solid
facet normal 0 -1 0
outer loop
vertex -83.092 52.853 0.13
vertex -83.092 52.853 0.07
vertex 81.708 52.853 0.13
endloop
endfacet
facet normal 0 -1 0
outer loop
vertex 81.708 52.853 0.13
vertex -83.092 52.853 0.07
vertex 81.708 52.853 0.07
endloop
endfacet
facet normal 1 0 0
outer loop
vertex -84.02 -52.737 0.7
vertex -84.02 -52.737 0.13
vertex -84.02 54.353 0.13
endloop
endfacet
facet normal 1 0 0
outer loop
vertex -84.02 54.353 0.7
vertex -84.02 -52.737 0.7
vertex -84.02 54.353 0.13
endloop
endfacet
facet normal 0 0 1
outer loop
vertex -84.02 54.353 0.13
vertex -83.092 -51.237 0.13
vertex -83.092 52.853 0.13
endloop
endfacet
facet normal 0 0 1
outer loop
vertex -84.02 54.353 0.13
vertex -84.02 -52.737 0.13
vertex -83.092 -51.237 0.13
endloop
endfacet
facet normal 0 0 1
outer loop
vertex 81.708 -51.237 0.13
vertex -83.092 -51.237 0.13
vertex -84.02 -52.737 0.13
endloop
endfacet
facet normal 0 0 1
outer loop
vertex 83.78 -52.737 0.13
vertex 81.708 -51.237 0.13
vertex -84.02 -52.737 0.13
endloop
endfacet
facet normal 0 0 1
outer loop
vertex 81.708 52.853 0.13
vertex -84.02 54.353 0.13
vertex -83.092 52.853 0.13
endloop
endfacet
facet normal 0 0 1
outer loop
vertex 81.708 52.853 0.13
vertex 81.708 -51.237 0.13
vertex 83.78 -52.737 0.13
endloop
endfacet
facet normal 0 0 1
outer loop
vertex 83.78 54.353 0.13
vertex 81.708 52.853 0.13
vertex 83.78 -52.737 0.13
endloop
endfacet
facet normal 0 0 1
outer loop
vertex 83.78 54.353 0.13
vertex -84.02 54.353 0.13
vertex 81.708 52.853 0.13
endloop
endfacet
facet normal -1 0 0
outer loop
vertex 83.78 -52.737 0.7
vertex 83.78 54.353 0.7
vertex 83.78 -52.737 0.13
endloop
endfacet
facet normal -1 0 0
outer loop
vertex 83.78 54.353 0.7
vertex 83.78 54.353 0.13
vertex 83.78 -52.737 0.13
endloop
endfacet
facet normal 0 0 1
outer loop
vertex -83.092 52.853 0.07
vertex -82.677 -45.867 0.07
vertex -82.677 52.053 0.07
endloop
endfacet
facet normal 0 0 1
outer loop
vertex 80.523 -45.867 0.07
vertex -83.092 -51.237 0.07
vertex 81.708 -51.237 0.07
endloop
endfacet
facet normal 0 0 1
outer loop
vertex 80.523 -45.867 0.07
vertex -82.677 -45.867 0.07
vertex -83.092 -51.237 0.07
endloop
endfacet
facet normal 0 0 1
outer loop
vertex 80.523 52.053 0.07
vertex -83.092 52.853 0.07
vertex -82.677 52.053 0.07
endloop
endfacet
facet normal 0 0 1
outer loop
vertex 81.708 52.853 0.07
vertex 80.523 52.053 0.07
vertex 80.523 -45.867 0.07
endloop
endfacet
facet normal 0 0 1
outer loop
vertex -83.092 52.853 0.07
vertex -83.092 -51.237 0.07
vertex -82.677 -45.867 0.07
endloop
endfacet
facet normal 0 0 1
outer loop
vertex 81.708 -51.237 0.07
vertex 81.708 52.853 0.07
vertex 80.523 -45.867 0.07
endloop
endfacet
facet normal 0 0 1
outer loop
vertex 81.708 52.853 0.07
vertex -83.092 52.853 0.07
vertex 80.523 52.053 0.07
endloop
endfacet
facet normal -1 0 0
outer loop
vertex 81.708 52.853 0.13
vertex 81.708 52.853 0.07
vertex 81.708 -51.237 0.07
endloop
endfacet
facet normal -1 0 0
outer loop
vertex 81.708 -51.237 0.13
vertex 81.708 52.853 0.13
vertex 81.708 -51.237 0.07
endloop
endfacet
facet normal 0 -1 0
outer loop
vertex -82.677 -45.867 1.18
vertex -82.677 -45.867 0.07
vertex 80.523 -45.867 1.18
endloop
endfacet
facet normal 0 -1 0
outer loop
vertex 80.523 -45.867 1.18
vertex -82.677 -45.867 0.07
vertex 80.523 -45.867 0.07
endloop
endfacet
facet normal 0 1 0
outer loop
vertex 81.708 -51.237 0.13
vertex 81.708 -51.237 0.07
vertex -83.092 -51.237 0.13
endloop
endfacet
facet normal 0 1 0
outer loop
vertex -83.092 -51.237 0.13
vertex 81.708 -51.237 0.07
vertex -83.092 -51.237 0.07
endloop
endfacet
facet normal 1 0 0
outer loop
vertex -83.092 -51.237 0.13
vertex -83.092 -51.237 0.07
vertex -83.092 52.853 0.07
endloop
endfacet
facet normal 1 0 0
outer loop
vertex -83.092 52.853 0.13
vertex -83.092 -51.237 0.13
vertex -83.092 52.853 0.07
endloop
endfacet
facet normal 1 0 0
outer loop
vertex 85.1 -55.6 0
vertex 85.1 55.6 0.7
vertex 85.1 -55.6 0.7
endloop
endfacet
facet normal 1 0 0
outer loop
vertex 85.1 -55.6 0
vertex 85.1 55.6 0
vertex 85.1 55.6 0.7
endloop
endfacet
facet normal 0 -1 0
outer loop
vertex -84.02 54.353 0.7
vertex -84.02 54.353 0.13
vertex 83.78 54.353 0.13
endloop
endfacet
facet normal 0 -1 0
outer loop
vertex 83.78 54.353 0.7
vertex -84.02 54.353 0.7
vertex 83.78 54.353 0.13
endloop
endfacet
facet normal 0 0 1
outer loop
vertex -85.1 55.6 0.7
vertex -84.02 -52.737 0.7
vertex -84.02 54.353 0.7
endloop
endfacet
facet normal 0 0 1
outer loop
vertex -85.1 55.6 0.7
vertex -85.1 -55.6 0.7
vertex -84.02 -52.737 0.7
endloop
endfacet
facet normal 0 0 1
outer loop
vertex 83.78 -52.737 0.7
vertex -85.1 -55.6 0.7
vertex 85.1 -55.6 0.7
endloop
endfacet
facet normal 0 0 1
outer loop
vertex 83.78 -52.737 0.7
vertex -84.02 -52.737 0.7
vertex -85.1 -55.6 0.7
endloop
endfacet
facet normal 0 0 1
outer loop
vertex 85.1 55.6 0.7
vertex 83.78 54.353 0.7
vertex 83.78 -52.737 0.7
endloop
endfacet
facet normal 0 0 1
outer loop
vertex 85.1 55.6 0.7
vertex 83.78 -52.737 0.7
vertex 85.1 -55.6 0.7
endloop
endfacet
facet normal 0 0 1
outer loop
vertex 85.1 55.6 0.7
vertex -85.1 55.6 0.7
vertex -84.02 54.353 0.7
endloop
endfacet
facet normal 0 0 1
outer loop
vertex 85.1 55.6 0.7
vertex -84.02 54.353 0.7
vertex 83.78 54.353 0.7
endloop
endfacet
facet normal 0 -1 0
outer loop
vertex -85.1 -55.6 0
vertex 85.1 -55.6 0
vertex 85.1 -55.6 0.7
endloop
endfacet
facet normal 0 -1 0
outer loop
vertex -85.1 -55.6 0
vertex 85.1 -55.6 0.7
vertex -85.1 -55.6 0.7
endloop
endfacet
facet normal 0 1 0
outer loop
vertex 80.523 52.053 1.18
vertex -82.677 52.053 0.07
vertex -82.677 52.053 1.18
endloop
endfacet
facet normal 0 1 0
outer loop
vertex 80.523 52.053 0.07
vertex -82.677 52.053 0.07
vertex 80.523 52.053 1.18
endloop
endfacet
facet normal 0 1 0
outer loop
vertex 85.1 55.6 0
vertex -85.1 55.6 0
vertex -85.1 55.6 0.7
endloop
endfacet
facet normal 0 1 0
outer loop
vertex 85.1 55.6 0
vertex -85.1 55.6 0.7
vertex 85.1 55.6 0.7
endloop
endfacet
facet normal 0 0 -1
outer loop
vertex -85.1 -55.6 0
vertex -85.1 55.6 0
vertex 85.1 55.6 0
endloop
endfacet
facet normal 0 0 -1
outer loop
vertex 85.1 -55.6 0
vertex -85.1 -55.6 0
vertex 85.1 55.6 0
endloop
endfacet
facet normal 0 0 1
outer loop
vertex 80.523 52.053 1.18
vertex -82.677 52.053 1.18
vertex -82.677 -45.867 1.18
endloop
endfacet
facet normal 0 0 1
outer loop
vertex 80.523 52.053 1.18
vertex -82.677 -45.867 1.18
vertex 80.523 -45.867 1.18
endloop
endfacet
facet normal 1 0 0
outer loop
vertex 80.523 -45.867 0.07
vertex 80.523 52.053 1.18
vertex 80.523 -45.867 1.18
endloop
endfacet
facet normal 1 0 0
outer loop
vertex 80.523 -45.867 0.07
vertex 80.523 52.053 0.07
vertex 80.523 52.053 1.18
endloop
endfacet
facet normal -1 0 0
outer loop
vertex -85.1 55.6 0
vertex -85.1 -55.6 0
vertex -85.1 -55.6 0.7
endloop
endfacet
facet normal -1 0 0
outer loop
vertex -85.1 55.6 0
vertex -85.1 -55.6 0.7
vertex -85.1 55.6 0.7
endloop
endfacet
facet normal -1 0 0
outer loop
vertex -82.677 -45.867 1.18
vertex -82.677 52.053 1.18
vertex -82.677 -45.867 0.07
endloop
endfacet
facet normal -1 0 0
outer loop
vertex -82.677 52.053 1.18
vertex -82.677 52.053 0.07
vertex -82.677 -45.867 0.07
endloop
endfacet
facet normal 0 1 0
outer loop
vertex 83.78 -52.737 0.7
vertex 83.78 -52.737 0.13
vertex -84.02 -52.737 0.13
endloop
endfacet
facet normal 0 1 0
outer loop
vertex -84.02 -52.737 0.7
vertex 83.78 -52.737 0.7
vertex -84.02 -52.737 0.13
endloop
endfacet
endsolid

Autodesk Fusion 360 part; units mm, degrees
sketch "Sketch1" plane through (0, 0, 0) normal (0, 0, 1) x (1, 0, 0)
  line L0 (-85.1, 55.6) -> (85.1, 55.6)
  line L1 (85.1, 55.6) -> (85.1, -55.6)
  line L2 (85.1, -55.6) -> (-85.1, -55.6)
  line L3 (-85.1, -55.6) -> (-85.1, 55.6)
  line L4 (-85.1, 55.6) -> (85.1, -55.6) construction
  line L5 (85.1, 55.6) -> (-85.1, -55.6) construction
  line L6 (-84.0199, 54.3533) -> (83.7801, 54.3533)
  line L7 (83.7801, 54.3533) -> (83.7801, -52.7367)
  line L8 (83.7801, -52.7367) -> (-84.0199, -52.7367)
  line L9 (-84.0199, -52.7367) -> (-84.0199, 54.3533)
  line L10 (-83.0921, 52.8533) -> (81.7079, 52.8533)
  line L11 (81.7079, 52.8533) -> (81.7079, -51.2367)
  line L12 (81.7079, -51.2367) -> (-83.0921, -51.2367)
  line L13 (-83.0921, -51.2367) -> (-83.0921, 52.8533)
  line L14 (-82.6768, 52.0533) -> (80.5232, 52.0533)
  line L15 (80.5232, 52.0533) -> (80.5232, -45.8667)
  line L16 (-82.6768, 52.0533) -> (-82.6768, -45.8667)
  line L17 (-82.6768, -45.8667) -> (80.5232, -45.8667)
  dimension "d1" = 170.2
  dimension "d2" = 111.2
  dimension "d5" = 107.09
  dimension "d9" = 164.8
  dimension "d10" = 104.09
  dimension "d12" = 163.2
  dimension "d14" = 97.92
extrude "Extrude1" add sketch "Sketch1" along normal blind 0.7 contours L0 L1 L2 L3
extrude "Extrude2" add sketch "Sketch1" along normal blind 0.13 contours L6 L7 L8 L9
extrude "Extrude3" add sketch "Sketch1" along normal blind 0.07 contours L10 L11 L12 L13
extrude "Extrude4" add sketch "Sketch1" along normal blind 1.18 contours L14 L15 L16 L17
